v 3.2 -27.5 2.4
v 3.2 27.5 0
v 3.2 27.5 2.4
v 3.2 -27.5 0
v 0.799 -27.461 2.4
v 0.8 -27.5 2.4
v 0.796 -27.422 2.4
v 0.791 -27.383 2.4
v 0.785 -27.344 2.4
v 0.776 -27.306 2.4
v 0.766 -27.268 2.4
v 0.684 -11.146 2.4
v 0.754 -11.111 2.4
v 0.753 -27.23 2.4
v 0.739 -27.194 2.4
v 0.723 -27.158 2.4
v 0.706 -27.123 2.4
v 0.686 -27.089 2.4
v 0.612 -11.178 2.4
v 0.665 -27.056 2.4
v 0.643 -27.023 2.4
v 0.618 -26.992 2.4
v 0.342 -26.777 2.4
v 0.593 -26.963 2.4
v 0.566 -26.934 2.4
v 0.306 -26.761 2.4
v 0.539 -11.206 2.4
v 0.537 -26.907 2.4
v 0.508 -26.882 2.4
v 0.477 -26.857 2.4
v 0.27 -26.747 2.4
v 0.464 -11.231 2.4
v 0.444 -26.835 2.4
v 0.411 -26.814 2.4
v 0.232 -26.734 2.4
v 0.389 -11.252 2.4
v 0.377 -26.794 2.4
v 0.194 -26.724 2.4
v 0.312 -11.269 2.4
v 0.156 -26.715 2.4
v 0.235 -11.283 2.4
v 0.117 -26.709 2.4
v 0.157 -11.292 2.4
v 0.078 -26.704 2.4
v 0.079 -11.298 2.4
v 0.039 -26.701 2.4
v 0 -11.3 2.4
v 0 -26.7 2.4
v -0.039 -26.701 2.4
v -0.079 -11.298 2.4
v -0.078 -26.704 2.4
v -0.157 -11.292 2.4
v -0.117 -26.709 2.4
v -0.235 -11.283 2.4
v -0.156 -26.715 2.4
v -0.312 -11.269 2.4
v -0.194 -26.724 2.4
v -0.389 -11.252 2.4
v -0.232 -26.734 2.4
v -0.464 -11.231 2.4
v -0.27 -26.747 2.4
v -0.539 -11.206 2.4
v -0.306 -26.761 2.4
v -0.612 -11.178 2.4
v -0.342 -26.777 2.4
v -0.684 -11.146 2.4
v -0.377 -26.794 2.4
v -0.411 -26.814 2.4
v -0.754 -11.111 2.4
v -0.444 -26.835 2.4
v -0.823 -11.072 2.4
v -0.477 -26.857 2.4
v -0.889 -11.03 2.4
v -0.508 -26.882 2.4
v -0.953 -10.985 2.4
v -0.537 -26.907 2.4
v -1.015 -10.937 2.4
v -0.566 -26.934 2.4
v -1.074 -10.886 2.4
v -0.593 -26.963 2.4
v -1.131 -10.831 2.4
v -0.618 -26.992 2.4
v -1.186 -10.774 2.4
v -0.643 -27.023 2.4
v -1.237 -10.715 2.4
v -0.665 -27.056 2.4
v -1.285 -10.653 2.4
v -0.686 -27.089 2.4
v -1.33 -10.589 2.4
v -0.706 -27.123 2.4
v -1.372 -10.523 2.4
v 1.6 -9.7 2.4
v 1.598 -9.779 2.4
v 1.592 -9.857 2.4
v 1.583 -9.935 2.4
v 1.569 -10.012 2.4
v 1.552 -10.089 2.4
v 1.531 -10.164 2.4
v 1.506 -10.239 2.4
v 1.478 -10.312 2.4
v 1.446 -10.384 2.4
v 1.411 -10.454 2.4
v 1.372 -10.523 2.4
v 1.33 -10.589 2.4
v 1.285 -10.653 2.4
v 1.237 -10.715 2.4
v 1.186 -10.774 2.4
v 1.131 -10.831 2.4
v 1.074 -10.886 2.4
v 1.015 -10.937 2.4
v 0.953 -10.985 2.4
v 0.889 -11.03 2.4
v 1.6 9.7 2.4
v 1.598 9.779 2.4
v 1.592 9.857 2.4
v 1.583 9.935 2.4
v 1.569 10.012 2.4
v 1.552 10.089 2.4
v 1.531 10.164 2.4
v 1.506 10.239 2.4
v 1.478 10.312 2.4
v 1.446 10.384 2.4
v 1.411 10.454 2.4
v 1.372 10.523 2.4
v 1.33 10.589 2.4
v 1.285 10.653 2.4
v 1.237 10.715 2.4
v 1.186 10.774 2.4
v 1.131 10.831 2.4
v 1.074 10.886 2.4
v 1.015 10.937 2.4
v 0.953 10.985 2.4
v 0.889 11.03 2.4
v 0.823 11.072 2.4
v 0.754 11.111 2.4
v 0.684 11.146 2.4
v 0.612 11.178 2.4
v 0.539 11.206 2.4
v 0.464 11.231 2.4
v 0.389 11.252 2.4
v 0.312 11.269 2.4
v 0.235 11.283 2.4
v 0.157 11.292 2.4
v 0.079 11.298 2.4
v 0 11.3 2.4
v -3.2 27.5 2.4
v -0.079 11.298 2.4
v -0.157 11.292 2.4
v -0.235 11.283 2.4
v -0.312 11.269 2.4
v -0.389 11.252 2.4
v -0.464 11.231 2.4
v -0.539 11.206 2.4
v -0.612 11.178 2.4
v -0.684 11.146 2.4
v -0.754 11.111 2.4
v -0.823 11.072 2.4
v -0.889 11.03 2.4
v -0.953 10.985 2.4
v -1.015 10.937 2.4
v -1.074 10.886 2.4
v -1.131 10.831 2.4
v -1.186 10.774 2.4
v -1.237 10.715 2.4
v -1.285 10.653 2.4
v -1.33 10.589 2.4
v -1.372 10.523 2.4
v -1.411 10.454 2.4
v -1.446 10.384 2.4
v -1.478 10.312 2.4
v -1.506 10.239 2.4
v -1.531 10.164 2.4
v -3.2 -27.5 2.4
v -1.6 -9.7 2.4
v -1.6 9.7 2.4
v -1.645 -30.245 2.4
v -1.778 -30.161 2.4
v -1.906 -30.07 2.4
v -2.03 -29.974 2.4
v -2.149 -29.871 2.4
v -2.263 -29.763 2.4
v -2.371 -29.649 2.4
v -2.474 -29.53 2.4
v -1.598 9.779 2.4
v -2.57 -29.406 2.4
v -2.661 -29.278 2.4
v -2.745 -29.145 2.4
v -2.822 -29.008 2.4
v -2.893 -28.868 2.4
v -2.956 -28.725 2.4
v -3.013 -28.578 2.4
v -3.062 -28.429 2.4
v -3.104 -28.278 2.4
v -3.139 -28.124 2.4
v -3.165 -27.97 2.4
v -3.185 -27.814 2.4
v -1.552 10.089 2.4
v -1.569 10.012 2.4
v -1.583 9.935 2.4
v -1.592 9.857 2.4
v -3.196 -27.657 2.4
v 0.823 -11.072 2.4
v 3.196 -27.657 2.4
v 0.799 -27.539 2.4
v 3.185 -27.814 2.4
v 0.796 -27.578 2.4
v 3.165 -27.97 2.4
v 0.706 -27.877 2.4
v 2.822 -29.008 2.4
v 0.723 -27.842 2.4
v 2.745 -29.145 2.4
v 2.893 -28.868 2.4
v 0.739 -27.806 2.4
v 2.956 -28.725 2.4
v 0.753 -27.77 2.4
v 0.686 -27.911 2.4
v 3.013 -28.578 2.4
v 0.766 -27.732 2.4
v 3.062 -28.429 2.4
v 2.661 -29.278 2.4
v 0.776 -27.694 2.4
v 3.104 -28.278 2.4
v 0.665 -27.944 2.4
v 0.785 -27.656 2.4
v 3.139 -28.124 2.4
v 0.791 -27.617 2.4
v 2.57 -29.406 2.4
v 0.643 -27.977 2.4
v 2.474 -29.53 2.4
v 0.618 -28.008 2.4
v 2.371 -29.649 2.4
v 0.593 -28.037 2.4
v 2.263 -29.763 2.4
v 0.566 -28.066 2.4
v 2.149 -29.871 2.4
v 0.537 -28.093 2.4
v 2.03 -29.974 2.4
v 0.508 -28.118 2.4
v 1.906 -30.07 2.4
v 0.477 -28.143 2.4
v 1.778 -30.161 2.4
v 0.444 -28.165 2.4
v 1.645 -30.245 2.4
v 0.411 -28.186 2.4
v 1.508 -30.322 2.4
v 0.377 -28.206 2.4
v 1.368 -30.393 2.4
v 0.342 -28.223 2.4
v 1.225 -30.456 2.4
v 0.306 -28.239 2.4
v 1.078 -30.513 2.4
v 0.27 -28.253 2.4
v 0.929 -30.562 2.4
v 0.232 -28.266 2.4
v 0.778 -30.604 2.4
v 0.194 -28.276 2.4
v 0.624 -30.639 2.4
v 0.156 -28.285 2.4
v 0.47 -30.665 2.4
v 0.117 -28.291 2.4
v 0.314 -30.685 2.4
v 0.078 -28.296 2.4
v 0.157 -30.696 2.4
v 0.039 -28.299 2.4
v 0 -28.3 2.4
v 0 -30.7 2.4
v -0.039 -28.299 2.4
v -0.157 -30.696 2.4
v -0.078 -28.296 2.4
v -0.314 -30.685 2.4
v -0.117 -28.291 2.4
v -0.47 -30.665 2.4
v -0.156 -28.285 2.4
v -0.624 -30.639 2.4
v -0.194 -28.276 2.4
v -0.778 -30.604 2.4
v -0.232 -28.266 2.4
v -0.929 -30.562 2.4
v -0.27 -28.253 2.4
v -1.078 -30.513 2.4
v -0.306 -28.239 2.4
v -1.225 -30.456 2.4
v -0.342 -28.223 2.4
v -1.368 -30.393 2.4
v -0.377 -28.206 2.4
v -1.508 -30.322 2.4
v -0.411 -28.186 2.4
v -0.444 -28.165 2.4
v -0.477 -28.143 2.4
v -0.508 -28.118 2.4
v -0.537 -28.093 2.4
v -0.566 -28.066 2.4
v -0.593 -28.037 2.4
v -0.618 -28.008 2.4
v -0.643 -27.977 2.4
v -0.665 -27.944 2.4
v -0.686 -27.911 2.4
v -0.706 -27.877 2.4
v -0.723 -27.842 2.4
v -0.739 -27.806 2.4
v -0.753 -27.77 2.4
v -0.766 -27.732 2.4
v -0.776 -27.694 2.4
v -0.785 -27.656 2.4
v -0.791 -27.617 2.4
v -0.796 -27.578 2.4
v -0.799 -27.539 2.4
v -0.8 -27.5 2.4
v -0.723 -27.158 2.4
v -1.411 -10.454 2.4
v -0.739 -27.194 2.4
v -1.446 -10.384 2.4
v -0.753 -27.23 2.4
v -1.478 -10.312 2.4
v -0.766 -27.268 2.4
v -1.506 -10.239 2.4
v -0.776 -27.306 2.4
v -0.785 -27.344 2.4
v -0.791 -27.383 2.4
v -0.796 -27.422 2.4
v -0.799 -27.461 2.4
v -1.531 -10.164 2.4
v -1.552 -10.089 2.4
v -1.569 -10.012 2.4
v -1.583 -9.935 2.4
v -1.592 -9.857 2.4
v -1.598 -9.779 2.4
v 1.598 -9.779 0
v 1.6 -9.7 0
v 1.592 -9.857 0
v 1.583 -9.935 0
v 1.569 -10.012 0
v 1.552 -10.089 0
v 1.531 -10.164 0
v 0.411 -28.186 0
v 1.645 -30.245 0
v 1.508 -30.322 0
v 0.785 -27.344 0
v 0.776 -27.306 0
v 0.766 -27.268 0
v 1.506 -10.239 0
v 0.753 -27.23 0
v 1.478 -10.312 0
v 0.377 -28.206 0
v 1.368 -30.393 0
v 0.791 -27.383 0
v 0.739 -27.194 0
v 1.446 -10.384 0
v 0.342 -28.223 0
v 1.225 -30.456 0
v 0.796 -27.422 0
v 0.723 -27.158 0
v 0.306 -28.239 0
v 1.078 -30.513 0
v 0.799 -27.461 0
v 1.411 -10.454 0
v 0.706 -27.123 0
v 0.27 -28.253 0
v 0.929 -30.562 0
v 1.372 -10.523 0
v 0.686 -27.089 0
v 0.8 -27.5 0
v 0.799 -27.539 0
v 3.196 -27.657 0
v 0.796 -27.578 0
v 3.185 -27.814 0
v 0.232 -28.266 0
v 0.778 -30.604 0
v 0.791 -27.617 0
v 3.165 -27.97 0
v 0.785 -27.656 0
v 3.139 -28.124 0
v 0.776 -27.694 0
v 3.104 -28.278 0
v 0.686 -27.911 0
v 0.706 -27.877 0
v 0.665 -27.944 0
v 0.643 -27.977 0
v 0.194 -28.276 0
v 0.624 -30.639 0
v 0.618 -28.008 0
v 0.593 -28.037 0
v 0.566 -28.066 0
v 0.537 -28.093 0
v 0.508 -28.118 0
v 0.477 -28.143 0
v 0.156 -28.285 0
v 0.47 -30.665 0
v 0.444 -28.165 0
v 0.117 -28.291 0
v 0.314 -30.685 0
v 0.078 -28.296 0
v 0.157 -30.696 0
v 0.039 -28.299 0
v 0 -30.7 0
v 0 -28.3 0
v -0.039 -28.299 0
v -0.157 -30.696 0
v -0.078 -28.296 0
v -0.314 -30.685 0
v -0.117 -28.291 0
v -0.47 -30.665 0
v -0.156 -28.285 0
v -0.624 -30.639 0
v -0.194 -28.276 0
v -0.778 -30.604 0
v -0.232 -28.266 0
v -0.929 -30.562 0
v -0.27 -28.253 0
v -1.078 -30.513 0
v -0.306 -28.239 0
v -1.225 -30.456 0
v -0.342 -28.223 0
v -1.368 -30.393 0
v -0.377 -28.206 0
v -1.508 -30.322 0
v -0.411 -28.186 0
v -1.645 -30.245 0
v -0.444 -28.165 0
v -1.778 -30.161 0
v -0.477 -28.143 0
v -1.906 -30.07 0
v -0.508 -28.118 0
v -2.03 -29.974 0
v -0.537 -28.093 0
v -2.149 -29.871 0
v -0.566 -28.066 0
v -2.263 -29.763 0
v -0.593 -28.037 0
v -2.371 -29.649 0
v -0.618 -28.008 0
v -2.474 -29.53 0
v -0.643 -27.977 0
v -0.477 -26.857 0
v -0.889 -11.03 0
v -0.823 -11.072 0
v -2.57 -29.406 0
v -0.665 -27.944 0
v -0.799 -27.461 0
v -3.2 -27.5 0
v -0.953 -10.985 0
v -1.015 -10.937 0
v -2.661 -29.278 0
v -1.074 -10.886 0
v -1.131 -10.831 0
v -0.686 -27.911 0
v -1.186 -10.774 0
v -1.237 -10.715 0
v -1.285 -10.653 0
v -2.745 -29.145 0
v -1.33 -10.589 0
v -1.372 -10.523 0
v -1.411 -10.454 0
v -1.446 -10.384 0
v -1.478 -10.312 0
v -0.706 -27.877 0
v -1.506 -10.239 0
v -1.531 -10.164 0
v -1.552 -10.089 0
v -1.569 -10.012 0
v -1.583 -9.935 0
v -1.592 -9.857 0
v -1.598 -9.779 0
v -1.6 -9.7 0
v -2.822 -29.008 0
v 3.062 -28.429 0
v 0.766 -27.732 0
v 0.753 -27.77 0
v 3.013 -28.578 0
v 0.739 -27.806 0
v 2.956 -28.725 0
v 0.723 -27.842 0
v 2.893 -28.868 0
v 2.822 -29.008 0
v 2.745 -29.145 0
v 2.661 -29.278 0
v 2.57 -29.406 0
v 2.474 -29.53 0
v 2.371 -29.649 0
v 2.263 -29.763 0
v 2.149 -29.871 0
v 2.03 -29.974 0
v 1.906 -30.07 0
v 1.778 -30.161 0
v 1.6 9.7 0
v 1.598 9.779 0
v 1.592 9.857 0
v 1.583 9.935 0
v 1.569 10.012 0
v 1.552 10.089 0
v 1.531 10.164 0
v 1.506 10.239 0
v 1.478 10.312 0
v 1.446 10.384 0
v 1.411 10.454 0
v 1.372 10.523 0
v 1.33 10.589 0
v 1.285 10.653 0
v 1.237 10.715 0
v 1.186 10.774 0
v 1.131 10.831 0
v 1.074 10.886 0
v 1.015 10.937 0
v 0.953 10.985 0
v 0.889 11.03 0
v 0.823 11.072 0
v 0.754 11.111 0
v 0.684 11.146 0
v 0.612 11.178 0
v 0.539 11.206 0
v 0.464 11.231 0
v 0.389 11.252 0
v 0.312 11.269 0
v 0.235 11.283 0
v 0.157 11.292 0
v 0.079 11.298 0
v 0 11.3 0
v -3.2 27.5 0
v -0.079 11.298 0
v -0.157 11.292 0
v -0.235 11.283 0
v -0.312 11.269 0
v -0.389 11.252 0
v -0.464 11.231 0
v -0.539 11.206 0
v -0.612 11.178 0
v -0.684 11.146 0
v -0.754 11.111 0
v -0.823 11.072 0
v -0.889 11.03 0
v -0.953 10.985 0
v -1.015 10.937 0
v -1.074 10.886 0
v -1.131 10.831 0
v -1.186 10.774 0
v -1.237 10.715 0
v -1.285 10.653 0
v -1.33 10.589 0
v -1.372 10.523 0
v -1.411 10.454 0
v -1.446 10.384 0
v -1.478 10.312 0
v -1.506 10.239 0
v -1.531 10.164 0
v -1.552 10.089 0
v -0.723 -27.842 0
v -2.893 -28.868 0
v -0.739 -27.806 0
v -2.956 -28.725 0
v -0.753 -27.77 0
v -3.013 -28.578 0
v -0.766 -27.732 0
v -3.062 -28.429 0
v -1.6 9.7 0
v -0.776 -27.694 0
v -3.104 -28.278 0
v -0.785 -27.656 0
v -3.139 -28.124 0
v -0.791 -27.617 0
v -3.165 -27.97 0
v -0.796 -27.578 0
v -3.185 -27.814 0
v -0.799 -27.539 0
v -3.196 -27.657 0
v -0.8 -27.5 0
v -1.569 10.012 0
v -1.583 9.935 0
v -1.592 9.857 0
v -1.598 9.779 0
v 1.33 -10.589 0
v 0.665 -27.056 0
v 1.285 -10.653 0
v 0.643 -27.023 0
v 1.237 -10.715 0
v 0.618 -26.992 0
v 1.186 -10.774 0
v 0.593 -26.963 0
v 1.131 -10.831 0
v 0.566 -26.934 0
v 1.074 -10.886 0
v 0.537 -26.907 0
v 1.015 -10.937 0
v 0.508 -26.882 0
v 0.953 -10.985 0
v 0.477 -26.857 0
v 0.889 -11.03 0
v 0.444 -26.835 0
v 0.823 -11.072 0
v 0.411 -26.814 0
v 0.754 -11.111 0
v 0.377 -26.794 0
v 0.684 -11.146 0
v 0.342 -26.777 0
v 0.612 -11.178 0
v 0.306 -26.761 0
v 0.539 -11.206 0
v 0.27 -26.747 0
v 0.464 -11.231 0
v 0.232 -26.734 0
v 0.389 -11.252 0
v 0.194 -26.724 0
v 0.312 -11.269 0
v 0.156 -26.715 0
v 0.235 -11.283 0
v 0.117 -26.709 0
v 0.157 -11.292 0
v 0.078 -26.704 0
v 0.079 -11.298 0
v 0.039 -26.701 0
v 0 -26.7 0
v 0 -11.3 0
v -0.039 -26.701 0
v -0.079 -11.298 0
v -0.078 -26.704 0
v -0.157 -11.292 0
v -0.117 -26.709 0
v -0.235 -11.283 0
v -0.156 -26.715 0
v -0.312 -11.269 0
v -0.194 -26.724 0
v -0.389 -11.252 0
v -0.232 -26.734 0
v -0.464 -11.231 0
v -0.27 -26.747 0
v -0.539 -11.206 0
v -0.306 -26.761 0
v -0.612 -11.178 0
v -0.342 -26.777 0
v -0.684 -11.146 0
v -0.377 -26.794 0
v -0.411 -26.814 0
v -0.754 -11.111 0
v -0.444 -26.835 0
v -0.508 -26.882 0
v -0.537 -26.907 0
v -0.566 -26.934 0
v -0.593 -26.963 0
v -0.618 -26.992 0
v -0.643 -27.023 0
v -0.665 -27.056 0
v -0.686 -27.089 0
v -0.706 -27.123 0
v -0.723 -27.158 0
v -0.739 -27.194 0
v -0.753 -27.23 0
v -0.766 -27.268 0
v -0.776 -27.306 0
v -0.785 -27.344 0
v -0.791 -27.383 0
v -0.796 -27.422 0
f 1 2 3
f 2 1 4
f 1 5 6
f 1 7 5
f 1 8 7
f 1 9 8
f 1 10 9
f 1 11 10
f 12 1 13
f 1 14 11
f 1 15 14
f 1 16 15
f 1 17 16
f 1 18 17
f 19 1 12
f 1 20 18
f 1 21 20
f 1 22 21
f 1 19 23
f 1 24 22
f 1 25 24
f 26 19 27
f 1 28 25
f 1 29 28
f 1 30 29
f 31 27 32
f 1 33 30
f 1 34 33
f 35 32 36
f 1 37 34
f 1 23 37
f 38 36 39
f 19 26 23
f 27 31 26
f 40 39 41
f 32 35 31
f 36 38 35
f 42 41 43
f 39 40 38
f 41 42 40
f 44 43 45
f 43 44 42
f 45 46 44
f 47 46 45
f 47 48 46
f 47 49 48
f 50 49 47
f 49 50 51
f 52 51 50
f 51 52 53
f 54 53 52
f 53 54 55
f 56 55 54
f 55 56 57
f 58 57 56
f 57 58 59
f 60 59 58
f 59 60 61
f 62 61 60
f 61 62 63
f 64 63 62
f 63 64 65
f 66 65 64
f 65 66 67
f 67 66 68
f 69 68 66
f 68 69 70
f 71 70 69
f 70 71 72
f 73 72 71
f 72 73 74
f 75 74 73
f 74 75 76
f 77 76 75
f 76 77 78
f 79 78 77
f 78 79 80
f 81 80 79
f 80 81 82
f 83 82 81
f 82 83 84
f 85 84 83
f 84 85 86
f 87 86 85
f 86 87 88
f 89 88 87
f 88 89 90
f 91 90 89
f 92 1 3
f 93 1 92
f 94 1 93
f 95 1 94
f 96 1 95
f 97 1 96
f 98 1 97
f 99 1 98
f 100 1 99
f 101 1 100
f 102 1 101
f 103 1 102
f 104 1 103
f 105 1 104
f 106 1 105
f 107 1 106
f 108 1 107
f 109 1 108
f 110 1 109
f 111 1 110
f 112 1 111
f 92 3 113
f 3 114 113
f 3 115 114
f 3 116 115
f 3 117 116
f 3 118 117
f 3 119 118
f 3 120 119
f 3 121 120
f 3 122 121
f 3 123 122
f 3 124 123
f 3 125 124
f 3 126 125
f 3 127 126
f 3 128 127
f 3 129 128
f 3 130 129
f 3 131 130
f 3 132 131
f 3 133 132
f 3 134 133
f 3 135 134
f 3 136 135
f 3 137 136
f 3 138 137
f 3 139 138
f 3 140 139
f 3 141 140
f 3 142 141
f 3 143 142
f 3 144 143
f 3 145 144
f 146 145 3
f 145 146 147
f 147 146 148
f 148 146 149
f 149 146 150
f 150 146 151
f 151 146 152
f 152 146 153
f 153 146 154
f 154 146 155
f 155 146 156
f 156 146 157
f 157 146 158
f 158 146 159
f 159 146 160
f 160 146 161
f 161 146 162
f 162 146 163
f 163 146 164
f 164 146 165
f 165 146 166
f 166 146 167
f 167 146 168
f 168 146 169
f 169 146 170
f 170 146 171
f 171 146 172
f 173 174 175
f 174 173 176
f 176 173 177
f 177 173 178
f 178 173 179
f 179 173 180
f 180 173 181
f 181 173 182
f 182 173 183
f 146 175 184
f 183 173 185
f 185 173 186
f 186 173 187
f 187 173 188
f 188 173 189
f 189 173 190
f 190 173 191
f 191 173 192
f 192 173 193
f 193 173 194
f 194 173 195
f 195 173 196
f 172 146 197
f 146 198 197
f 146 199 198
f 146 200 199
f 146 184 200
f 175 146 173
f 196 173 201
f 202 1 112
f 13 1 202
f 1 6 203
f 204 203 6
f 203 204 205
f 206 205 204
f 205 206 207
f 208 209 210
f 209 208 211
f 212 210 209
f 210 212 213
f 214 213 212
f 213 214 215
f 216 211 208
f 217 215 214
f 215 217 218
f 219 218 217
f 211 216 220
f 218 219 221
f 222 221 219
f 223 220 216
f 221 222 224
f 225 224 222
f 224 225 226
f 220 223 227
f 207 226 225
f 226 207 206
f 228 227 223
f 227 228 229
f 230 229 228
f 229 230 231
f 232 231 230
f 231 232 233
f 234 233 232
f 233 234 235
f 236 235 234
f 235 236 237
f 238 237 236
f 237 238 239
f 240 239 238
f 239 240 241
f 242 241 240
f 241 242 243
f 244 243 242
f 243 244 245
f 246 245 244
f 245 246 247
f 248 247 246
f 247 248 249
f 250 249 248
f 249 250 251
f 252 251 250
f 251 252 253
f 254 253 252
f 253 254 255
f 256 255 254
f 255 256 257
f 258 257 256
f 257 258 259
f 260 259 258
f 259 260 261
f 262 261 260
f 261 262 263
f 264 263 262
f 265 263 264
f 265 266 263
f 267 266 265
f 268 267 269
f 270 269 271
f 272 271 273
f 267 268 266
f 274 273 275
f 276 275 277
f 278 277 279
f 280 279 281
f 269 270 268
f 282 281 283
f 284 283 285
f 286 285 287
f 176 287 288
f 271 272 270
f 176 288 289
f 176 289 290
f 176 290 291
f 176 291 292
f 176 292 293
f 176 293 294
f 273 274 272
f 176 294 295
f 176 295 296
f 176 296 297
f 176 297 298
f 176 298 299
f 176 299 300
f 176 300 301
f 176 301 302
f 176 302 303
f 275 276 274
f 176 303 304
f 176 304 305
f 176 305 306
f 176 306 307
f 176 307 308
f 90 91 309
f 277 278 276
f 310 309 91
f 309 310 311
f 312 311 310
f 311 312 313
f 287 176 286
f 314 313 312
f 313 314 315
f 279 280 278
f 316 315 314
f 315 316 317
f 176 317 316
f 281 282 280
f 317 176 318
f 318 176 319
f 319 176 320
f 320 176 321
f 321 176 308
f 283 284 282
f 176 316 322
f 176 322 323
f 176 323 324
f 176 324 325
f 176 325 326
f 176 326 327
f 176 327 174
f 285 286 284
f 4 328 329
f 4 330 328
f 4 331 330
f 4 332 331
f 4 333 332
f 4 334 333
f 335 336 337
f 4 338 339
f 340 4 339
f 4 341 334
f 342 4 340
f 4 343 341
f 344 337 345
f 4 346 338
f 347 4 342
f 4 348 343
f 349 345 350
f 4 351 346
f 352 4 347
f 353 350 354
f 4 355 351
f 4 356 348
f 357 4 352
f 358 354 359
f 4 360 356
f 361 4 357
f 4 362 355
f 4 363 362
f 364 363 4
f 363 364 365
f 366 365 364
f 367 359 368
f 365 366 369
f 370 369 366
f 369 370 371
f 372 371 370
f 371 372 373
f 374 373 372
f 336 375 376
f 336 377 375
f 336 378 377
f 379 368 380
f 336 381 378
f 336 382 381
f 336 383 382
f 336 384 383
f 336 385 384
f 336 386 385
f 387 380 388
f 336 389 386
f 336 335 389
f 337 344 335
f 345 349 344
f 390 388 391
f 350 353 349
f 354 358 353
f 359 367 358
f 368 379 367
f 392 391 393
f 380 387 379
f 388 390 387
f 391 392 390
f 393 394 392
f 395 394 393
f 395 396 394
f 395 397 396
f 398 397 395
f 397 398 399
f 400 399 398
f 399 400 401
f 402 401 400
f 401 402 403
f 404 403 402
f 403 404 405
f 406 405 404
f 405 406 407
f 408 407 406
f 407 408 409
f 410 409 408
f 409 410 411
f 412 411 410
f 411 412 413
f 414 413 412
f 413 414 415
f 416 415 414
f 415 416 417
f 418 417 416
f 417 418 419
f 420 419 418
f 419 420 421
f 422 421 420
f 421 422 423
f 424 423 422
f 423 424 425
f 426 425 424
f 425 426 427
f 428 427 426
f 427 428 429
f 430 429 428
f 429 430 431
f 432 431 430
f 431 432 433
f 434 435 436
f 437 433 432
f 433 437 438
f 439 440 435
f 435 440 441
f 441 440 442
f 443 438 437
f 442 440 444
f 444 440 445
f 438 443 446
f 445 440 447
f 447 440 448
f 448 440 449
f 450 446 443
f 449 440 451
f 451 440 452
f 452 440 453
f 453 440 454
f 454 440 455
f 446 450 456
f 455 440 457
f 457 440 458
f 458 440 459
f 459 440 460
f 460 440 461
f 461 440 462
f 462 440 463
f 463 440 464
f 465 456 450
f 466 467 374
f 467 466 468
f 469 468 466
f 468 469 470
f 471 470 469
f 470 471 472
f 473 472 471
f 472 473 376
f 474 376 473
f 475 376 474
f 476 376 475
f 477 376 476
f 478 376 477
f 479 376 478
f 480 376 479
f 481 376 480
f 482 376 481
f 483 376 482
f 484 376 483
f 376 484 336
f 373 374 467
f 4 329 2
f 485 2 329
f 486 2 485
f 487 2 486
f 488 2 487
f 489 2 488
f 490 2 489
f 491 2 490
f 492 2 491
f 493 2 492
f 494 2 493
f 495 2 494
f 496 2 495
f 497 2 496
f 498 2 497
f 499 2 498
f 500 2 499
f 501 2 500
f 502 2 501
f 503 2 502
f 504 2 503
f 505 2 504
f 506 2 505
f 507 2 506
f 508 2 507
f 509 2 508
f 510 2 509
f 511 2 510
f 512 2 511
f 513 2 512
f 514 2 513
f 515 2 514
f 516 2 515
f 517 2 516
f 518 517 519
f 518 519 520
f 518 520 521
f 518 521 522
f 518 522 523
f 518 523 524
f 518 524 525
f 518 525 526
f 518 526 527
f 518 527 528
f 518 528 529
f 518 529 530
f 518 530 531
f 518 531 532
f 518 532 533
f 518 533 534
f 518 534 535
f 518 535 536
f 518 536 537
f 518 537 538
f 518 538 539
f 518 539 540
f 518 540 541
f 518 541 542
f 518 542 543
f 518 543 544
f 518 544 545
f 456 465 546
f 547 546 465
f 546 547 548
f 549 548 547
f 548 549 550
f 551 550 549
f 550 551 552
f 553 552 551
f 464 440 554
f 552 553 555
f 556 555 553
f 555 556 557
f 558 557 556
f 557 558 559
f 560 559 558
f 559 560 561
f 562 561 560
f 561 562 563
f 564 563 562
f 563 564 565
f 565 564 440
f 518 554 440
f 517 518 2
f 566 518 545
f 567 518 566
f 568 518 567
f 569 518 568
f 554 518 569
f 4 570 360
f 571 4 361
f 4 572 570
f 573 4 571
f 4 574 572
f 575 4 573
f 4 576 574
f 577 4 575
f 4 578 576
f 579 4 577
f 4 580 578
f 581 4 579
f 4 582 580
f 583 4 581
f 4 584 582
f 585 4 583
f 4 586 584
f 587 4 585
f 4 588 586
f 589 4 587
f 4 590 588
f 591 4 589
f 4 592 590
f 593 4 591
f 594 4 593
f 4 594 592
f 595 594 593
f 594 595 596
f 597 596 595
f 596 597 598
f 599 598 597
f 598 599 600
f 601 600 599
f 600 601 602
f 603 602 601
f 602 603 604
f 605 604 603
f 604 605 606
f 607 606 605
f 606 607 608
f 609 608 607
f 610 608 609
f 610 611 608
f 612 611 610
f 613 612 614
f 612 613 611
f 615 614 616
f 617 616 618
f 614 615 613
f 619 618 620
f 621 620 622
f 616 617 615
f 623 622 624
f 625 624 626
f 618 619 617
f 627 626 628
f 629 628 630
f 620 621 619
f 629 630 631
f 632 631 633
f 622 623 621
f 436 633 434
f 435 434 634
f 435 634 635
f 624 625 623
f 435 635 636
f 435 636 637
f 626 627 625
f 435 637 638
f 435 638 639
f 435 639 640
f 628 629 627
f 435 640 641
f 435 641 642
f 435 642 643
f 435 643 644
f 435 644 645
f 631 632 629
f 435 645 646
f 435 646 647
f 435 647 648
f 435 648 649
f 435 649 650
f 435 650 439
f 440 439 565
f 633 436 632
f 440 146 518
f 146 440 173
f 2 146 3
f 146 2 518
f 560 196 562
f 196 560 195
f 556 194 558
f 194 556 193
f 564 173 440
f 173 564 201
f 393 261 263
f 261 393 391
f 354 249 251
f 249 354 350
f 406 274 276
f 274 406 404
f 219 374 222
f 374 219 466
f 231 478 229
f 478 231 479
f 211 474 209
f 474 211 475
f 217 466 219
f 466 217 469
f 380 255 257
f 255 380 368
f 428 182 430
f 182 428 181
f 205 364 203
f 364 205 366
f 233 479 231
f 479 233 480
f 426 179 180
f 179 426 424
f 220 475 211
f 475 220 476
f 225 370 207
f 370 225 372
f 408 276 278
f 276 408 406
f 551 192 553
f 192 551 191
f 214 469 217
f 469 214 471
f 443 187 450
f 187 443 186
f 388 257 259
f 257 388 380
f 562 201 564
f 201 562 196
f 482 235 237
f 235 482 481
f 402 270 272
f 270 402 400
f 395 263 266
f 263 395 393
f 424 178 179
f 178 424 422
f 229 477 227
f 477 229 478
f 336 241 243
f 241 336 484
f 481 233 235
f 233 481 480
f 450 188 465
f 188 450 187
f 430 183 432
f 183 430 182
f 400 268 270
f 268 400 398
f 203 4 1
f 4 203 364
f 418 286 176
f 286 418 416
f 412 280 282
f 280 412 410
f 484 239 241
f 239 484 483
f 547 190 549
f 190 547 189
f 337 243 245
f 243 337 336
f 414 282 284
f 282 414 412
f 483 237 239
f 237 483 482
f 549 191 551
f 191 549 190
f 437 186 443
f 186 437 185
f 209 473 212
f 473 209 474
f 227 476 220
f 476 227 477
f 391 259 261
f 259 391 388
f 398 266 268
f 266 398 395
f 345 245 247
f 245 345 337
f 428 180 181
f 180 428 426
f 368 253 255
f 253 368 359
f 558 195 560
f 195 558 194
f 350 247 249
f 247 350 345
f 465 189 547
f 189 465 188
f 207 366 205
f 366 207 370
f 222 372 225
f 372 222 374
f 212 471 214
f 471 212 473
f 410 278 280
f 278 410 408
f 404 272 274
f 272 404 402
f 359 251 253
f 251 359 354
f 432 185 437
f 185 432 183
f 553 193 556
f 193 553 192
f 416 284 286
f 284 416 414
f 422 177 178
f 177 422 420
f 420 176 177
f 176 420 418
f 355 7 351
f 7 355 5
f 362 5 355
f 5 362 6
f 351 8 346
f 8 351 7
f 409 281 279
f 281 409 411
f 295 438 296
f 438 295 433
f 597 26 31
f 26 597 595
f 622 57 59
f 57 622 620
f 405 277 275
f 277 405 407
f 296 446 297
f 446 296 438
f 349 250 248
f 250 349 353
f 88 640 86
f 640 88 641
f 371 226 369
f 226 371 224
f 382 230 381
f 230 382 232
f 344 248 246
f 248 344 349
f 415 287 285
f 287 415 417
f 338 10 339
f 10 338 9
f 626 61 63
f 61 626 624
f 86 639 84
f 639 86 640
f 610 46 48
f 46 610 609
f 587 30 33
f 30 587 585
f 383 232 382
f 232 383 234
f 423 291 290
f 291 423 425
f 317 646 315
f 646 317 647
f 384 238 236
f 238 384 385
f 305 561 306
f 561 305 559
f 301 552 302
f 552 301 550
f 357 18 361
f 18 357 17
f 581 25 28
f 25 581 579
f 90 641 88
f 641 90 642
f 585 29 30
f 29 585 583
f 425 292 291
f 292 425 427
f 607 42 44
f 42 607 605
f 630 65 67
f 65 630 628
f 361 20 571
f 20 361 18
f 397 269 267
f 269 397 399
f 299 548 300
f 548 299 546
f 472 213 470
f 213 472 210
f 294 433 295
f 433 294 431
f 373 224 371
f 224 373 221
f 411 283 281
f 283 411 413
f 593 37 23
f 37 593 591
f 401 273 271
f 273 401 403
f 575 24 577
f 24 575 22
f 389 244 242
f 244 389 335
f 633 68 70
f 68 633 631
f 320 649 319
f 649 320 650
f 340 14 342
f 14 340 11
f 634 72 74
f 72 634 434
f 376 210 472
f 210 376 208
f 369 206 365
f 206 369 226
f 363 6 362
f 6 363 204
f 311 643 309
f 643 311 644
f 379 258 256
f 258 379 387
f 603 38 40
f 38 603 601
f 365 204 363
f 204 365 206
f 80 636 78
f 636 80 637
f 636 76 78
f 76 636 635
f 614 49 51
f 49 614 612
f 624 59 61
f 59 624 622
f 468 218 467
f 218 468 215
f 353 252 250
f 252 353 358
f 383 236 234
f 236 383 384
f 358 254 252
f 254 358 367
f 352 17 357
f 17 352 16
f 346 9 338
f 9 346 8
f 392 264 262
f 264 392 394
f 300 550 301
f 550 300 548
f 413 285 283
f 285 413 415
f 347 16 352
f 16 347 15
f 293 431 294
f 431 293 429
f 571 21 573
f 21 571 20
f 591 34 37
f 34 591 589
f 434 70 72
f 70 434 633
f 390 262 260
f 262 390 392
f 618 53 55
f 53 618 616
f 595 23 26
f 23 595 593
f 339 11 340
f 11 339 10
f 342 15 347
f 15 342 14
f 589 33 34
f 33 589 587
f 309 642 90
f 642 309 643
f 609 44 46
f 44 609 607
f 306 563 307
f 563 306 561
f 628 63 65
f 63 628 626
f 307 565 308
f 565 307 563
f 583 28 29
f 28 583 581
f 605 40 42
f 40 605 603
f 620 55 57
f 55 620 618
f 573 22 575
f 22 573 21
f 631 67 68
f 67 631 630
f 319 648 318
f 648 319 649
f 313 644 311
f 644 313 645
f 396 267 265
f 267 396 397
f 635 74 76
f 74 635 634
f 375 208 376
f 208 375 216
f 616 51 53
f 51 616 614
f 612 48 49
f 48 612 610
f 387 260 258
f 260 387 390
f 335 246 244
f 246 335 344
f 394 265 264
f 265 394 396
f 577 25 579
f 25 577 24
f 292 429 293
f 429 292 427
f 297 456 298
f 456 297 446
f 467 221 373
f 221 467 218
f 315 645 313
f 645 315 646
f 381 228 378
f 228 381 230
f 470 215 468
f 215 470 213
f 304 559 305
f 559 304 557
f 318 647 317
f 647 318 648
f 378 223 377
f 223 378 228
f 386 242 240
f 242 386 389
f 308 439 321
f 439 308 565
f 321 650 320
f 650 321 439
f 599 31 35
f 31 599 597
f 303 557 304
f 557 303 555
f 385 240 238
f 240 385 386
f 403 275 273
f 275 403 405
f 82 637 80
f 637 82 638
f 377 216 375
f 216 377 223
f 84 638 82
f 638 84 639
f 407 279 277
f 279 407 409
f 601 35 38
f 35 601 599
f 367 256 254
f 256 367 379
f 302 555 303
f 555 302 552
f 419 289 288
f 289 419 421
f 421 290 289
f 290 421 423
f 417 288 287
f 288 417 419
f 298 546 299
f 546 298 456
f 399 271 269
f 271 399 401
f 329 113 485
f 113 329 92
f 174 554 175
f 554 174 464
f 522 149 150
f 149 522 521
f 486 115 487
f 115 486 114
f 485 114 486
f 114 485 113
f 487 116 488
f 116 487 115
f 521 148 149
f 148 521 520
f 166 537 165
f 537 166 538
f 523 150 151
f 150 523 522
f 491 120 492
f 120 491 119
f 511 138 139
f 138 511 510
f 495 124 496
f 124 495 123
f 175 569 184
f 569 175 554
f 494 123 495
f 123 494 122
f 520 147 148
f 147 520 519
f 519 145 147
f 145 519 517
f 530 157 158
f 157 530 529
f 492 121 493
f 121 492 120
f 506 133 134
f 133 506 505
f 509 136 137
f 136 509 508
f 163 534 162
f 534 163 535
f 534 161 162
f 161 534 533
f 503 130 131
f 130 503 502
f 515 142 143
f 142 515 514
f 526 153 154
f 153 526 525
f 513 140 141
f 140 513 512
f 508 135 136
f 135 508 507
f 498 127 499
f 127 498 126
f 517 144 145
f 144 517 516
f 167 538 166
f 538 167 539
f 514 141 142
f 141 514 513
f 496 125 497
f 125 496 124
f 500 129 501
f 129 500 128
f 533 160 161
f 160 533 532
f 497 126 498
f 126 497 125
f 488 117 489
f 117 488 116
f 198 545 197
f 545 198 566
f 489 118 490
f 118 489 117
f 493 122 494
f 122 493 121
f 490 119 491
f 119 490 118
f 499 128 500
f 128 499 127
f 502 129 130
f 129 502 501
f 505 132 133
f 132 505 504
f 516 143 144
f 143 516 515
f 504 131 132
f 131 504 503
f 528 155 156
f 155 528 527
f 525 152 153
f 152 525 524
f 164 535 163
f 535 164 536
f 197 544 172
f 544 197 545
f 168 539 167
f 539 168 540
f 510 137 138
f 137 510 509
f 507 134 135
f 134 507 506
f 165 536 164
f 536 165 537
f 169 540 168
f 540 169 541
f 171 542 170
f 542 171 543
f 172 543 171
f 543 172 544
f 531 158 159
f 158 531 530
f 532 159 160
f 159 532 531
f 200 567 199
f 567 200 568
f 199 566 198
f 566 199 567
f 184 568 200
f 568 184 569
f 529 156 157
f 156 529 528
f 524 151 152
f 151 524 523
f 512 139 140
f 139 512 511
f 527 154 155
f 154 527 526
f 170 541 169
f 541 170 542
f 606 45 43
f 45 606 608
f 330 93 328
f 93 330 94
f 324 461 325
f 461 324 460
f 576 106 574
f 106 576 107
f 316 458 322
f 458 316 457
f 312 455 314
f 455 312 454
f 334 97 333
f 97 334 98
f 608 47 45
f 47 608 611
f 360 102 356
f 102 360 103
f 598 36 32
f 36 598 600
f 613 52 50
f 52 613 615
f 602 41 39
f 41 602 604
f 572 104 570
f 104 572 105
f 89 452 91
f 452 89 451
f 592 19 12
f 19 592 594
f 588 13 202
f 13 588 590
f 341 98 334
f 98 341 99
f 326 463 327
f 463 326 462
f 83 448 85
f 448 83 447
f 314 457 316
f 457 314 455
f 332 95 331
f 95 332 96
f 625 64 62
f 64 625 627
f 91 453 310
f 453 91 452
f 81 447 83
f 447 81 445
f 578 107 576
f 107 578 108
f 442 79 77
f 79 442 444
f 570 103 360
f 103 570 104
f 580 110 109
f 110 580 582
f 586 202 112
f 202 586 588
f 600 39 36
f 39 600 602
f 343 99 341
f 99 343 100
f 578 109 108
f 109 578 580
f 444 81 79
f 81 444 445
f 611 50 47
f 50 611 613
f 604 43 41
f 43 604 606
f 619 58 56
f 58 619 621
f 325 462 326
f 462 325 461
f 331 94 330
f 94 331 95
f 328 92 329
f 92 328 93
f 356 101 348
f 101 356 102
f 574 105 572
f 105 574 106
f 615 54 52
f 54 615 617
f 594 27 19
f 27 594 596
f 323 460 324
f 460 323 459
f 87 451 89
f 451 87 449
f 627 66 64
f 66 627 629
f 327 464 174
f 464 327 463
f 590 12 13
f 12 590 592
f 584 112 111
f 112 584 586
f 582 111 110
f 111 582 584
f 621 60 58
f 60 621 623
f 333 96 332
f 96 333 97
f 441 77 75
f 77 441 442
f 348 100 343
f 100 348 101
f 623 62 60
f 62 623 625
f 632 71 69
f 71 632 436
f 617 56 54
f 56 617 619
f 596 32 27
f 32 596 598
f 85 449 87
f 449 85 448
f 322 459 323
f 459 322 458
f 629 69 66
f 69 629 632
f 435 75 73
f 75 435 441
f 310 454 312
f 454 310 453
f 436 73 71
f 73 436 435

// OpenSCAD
// file: constants.scad
$fn = 128;
//dart_d = 19;  // elite dart diameter
//d_len = 95;   // elite dart length
dart_d = 13;  // elite dart diameter
d_len = 72;   // elite dart length
w_thickness = 1.6;  //multiples of 3d printer head diameter -> 4 * 0.4
chamber_count = 28;
//chamber_count = 10;
jam_slot_width = 5.6;
jam_slot_support_len = 8;
race1 = 10;  //bottom edge of bearing race position.
bearing_w = 4;
bearing_d = 10;
bearing_inner_d = 5;
ratchet_angle = -20;
clearance = 0.2;  // wherever plastic meets plastic

brushless_motor_d = 22;
brushless_motor_h = 12;
flywheel_thickness = w_thickness * 2;
brushless_motor_screw_d = 5;
brushless_motor_screw_mount_r = 19/2;

// calculated constants
dart_r = dart_d/2;

brushless_motor_screw_mount_side = brushless_motor_screw_mount_r * sqrt(2);
motormount_w = (dart_r + flywheel_thickness) * 2 + brushless_motor_d;

cyl_len = d_len + w_thickness * 2;
race2 = cyl_len - race1 - bearing_w; // bottom edge of upper bearing
toroid_r = dart_d + w_thickness;
chamber_r = dart_r + w_thickness;
chamber_d = chamber_r * 2;
cyl_degrees = 360/chamber_count;
// chambers only need 1 w_thickness between each other
cyl_draw_radius = (dart_r + w_thickness/2) / sin(cyl_degrees/2);
cyl_inner_thickness = w_thickness;

inner_r = cyl_draw_radius - dart_r - w_thickness;
final_inner = inner_r - cyl_inner_thickness;
race_r = final_inner + w_thickness;

// ratchet constants
post_d = w_thickness * 2;
slot_l = chamber_d + post_d; // a little extra movement
ratchet_l = chamber_d*2 + slot_l + post_d;
ratchet_w = post_d + w_thickness * 2;
ratchet_t = w_thickness * 1.5;

// constants for the motor mount and cylinder mount
cuff_outer_r = final_inner - w_thickness;
cuff_inner_r = cuff_outer_r - w_thickness;
cuff_h = cyl_len + w_thickness *2;
flange_r = cuff_outer_r + toroid_r;
bearing_mount_r = race_r - bearing_d/2;
mount_offset = race_r - bearing_d - w_thickness * 2;
mount_w = sqrt(cuff_outer_r * cuff_outer_r - mount_offset * mount_offset) * 2;
m_thickness = w_thickness * 2;
mount_alignment = m_thickness + (flywheel_thickness + brushless_motor_h)/2;
slider_t = cyl_draw_radius - mount_alignment - mount_offset;

// returns a list of angles for the points of a regular polygon
function regular_polygon_angles(order) = [for (i=[0:order-1]) i*(360/order)];

// returns a list of coordinates and angle for the endpoints of a regular polygon
function regular_polygon_translation(order, r=1) = [
    for (th=regular_polygon_angles(order)) [[r*cos(th), r*sin(th), 0], th]];

module pipe(h, inner, outer) {
    difference() {
        cylinder(h, r=outer);
        cylinder(h, r=inner);
    }
}
module toroid(circle_r, toroid_r, convexity=10) {
    rotate_extrude(convexity)
    translate([toroid_r, 0, 0]) circle(r = circle_r);

}
module slide_slot(w, h, l, c=-clearance) {
    t_w = w * 2/3;
    t_l = l/2 + c;
    // clearance can be negative when building the part that goes inside
    difference() {
        union() {
            cube([w-t_w, h, l], center=true);
            translate([0, 0, l-t_l])
                resize([t_w + c , 0, 0]) rotate([0, 45, 0])
                cube([t_w, h, t_w], center=true);
        }
        translate([0, 0, l])
            cube([l, h, l], center=true);
        
    }
}
// main file
include <constants.scad>

module slot () union () {
    // slot
    translate([0, 0, ratchet_t/2])
        cube([post_d, slot_l, ratchet_t], center=true);
    // rounded end 1
    translate([0, slot_l/2, 0])
        cylinder(d=post_d, h=ratchet_t);
    // rounded end 2
    translate([0, -slot_l/2, 0])
        cylinder(d=post_d, h=ratchet_t);
}

module bar () {
    difference () {
        union () {
            // main ratchet
            translate([0, 0, ratchet_t/2])
                cube([ratchet_w, ratchet_l, ratchet_t], center=true);
            // rounded end
            translate([0, -ratchet_l/2, 0])
                cylinder(d=ratchet_w, h=ratchet_t);
        }
        // spring hole
        translate([0, -ratchet_l/2, 0])
            cylinder(d=w_thickness, h=ratchet_t);
    }
}

module ratchet () {
    difference () {
        bar();
        slot();
    }
}
ratchet();
